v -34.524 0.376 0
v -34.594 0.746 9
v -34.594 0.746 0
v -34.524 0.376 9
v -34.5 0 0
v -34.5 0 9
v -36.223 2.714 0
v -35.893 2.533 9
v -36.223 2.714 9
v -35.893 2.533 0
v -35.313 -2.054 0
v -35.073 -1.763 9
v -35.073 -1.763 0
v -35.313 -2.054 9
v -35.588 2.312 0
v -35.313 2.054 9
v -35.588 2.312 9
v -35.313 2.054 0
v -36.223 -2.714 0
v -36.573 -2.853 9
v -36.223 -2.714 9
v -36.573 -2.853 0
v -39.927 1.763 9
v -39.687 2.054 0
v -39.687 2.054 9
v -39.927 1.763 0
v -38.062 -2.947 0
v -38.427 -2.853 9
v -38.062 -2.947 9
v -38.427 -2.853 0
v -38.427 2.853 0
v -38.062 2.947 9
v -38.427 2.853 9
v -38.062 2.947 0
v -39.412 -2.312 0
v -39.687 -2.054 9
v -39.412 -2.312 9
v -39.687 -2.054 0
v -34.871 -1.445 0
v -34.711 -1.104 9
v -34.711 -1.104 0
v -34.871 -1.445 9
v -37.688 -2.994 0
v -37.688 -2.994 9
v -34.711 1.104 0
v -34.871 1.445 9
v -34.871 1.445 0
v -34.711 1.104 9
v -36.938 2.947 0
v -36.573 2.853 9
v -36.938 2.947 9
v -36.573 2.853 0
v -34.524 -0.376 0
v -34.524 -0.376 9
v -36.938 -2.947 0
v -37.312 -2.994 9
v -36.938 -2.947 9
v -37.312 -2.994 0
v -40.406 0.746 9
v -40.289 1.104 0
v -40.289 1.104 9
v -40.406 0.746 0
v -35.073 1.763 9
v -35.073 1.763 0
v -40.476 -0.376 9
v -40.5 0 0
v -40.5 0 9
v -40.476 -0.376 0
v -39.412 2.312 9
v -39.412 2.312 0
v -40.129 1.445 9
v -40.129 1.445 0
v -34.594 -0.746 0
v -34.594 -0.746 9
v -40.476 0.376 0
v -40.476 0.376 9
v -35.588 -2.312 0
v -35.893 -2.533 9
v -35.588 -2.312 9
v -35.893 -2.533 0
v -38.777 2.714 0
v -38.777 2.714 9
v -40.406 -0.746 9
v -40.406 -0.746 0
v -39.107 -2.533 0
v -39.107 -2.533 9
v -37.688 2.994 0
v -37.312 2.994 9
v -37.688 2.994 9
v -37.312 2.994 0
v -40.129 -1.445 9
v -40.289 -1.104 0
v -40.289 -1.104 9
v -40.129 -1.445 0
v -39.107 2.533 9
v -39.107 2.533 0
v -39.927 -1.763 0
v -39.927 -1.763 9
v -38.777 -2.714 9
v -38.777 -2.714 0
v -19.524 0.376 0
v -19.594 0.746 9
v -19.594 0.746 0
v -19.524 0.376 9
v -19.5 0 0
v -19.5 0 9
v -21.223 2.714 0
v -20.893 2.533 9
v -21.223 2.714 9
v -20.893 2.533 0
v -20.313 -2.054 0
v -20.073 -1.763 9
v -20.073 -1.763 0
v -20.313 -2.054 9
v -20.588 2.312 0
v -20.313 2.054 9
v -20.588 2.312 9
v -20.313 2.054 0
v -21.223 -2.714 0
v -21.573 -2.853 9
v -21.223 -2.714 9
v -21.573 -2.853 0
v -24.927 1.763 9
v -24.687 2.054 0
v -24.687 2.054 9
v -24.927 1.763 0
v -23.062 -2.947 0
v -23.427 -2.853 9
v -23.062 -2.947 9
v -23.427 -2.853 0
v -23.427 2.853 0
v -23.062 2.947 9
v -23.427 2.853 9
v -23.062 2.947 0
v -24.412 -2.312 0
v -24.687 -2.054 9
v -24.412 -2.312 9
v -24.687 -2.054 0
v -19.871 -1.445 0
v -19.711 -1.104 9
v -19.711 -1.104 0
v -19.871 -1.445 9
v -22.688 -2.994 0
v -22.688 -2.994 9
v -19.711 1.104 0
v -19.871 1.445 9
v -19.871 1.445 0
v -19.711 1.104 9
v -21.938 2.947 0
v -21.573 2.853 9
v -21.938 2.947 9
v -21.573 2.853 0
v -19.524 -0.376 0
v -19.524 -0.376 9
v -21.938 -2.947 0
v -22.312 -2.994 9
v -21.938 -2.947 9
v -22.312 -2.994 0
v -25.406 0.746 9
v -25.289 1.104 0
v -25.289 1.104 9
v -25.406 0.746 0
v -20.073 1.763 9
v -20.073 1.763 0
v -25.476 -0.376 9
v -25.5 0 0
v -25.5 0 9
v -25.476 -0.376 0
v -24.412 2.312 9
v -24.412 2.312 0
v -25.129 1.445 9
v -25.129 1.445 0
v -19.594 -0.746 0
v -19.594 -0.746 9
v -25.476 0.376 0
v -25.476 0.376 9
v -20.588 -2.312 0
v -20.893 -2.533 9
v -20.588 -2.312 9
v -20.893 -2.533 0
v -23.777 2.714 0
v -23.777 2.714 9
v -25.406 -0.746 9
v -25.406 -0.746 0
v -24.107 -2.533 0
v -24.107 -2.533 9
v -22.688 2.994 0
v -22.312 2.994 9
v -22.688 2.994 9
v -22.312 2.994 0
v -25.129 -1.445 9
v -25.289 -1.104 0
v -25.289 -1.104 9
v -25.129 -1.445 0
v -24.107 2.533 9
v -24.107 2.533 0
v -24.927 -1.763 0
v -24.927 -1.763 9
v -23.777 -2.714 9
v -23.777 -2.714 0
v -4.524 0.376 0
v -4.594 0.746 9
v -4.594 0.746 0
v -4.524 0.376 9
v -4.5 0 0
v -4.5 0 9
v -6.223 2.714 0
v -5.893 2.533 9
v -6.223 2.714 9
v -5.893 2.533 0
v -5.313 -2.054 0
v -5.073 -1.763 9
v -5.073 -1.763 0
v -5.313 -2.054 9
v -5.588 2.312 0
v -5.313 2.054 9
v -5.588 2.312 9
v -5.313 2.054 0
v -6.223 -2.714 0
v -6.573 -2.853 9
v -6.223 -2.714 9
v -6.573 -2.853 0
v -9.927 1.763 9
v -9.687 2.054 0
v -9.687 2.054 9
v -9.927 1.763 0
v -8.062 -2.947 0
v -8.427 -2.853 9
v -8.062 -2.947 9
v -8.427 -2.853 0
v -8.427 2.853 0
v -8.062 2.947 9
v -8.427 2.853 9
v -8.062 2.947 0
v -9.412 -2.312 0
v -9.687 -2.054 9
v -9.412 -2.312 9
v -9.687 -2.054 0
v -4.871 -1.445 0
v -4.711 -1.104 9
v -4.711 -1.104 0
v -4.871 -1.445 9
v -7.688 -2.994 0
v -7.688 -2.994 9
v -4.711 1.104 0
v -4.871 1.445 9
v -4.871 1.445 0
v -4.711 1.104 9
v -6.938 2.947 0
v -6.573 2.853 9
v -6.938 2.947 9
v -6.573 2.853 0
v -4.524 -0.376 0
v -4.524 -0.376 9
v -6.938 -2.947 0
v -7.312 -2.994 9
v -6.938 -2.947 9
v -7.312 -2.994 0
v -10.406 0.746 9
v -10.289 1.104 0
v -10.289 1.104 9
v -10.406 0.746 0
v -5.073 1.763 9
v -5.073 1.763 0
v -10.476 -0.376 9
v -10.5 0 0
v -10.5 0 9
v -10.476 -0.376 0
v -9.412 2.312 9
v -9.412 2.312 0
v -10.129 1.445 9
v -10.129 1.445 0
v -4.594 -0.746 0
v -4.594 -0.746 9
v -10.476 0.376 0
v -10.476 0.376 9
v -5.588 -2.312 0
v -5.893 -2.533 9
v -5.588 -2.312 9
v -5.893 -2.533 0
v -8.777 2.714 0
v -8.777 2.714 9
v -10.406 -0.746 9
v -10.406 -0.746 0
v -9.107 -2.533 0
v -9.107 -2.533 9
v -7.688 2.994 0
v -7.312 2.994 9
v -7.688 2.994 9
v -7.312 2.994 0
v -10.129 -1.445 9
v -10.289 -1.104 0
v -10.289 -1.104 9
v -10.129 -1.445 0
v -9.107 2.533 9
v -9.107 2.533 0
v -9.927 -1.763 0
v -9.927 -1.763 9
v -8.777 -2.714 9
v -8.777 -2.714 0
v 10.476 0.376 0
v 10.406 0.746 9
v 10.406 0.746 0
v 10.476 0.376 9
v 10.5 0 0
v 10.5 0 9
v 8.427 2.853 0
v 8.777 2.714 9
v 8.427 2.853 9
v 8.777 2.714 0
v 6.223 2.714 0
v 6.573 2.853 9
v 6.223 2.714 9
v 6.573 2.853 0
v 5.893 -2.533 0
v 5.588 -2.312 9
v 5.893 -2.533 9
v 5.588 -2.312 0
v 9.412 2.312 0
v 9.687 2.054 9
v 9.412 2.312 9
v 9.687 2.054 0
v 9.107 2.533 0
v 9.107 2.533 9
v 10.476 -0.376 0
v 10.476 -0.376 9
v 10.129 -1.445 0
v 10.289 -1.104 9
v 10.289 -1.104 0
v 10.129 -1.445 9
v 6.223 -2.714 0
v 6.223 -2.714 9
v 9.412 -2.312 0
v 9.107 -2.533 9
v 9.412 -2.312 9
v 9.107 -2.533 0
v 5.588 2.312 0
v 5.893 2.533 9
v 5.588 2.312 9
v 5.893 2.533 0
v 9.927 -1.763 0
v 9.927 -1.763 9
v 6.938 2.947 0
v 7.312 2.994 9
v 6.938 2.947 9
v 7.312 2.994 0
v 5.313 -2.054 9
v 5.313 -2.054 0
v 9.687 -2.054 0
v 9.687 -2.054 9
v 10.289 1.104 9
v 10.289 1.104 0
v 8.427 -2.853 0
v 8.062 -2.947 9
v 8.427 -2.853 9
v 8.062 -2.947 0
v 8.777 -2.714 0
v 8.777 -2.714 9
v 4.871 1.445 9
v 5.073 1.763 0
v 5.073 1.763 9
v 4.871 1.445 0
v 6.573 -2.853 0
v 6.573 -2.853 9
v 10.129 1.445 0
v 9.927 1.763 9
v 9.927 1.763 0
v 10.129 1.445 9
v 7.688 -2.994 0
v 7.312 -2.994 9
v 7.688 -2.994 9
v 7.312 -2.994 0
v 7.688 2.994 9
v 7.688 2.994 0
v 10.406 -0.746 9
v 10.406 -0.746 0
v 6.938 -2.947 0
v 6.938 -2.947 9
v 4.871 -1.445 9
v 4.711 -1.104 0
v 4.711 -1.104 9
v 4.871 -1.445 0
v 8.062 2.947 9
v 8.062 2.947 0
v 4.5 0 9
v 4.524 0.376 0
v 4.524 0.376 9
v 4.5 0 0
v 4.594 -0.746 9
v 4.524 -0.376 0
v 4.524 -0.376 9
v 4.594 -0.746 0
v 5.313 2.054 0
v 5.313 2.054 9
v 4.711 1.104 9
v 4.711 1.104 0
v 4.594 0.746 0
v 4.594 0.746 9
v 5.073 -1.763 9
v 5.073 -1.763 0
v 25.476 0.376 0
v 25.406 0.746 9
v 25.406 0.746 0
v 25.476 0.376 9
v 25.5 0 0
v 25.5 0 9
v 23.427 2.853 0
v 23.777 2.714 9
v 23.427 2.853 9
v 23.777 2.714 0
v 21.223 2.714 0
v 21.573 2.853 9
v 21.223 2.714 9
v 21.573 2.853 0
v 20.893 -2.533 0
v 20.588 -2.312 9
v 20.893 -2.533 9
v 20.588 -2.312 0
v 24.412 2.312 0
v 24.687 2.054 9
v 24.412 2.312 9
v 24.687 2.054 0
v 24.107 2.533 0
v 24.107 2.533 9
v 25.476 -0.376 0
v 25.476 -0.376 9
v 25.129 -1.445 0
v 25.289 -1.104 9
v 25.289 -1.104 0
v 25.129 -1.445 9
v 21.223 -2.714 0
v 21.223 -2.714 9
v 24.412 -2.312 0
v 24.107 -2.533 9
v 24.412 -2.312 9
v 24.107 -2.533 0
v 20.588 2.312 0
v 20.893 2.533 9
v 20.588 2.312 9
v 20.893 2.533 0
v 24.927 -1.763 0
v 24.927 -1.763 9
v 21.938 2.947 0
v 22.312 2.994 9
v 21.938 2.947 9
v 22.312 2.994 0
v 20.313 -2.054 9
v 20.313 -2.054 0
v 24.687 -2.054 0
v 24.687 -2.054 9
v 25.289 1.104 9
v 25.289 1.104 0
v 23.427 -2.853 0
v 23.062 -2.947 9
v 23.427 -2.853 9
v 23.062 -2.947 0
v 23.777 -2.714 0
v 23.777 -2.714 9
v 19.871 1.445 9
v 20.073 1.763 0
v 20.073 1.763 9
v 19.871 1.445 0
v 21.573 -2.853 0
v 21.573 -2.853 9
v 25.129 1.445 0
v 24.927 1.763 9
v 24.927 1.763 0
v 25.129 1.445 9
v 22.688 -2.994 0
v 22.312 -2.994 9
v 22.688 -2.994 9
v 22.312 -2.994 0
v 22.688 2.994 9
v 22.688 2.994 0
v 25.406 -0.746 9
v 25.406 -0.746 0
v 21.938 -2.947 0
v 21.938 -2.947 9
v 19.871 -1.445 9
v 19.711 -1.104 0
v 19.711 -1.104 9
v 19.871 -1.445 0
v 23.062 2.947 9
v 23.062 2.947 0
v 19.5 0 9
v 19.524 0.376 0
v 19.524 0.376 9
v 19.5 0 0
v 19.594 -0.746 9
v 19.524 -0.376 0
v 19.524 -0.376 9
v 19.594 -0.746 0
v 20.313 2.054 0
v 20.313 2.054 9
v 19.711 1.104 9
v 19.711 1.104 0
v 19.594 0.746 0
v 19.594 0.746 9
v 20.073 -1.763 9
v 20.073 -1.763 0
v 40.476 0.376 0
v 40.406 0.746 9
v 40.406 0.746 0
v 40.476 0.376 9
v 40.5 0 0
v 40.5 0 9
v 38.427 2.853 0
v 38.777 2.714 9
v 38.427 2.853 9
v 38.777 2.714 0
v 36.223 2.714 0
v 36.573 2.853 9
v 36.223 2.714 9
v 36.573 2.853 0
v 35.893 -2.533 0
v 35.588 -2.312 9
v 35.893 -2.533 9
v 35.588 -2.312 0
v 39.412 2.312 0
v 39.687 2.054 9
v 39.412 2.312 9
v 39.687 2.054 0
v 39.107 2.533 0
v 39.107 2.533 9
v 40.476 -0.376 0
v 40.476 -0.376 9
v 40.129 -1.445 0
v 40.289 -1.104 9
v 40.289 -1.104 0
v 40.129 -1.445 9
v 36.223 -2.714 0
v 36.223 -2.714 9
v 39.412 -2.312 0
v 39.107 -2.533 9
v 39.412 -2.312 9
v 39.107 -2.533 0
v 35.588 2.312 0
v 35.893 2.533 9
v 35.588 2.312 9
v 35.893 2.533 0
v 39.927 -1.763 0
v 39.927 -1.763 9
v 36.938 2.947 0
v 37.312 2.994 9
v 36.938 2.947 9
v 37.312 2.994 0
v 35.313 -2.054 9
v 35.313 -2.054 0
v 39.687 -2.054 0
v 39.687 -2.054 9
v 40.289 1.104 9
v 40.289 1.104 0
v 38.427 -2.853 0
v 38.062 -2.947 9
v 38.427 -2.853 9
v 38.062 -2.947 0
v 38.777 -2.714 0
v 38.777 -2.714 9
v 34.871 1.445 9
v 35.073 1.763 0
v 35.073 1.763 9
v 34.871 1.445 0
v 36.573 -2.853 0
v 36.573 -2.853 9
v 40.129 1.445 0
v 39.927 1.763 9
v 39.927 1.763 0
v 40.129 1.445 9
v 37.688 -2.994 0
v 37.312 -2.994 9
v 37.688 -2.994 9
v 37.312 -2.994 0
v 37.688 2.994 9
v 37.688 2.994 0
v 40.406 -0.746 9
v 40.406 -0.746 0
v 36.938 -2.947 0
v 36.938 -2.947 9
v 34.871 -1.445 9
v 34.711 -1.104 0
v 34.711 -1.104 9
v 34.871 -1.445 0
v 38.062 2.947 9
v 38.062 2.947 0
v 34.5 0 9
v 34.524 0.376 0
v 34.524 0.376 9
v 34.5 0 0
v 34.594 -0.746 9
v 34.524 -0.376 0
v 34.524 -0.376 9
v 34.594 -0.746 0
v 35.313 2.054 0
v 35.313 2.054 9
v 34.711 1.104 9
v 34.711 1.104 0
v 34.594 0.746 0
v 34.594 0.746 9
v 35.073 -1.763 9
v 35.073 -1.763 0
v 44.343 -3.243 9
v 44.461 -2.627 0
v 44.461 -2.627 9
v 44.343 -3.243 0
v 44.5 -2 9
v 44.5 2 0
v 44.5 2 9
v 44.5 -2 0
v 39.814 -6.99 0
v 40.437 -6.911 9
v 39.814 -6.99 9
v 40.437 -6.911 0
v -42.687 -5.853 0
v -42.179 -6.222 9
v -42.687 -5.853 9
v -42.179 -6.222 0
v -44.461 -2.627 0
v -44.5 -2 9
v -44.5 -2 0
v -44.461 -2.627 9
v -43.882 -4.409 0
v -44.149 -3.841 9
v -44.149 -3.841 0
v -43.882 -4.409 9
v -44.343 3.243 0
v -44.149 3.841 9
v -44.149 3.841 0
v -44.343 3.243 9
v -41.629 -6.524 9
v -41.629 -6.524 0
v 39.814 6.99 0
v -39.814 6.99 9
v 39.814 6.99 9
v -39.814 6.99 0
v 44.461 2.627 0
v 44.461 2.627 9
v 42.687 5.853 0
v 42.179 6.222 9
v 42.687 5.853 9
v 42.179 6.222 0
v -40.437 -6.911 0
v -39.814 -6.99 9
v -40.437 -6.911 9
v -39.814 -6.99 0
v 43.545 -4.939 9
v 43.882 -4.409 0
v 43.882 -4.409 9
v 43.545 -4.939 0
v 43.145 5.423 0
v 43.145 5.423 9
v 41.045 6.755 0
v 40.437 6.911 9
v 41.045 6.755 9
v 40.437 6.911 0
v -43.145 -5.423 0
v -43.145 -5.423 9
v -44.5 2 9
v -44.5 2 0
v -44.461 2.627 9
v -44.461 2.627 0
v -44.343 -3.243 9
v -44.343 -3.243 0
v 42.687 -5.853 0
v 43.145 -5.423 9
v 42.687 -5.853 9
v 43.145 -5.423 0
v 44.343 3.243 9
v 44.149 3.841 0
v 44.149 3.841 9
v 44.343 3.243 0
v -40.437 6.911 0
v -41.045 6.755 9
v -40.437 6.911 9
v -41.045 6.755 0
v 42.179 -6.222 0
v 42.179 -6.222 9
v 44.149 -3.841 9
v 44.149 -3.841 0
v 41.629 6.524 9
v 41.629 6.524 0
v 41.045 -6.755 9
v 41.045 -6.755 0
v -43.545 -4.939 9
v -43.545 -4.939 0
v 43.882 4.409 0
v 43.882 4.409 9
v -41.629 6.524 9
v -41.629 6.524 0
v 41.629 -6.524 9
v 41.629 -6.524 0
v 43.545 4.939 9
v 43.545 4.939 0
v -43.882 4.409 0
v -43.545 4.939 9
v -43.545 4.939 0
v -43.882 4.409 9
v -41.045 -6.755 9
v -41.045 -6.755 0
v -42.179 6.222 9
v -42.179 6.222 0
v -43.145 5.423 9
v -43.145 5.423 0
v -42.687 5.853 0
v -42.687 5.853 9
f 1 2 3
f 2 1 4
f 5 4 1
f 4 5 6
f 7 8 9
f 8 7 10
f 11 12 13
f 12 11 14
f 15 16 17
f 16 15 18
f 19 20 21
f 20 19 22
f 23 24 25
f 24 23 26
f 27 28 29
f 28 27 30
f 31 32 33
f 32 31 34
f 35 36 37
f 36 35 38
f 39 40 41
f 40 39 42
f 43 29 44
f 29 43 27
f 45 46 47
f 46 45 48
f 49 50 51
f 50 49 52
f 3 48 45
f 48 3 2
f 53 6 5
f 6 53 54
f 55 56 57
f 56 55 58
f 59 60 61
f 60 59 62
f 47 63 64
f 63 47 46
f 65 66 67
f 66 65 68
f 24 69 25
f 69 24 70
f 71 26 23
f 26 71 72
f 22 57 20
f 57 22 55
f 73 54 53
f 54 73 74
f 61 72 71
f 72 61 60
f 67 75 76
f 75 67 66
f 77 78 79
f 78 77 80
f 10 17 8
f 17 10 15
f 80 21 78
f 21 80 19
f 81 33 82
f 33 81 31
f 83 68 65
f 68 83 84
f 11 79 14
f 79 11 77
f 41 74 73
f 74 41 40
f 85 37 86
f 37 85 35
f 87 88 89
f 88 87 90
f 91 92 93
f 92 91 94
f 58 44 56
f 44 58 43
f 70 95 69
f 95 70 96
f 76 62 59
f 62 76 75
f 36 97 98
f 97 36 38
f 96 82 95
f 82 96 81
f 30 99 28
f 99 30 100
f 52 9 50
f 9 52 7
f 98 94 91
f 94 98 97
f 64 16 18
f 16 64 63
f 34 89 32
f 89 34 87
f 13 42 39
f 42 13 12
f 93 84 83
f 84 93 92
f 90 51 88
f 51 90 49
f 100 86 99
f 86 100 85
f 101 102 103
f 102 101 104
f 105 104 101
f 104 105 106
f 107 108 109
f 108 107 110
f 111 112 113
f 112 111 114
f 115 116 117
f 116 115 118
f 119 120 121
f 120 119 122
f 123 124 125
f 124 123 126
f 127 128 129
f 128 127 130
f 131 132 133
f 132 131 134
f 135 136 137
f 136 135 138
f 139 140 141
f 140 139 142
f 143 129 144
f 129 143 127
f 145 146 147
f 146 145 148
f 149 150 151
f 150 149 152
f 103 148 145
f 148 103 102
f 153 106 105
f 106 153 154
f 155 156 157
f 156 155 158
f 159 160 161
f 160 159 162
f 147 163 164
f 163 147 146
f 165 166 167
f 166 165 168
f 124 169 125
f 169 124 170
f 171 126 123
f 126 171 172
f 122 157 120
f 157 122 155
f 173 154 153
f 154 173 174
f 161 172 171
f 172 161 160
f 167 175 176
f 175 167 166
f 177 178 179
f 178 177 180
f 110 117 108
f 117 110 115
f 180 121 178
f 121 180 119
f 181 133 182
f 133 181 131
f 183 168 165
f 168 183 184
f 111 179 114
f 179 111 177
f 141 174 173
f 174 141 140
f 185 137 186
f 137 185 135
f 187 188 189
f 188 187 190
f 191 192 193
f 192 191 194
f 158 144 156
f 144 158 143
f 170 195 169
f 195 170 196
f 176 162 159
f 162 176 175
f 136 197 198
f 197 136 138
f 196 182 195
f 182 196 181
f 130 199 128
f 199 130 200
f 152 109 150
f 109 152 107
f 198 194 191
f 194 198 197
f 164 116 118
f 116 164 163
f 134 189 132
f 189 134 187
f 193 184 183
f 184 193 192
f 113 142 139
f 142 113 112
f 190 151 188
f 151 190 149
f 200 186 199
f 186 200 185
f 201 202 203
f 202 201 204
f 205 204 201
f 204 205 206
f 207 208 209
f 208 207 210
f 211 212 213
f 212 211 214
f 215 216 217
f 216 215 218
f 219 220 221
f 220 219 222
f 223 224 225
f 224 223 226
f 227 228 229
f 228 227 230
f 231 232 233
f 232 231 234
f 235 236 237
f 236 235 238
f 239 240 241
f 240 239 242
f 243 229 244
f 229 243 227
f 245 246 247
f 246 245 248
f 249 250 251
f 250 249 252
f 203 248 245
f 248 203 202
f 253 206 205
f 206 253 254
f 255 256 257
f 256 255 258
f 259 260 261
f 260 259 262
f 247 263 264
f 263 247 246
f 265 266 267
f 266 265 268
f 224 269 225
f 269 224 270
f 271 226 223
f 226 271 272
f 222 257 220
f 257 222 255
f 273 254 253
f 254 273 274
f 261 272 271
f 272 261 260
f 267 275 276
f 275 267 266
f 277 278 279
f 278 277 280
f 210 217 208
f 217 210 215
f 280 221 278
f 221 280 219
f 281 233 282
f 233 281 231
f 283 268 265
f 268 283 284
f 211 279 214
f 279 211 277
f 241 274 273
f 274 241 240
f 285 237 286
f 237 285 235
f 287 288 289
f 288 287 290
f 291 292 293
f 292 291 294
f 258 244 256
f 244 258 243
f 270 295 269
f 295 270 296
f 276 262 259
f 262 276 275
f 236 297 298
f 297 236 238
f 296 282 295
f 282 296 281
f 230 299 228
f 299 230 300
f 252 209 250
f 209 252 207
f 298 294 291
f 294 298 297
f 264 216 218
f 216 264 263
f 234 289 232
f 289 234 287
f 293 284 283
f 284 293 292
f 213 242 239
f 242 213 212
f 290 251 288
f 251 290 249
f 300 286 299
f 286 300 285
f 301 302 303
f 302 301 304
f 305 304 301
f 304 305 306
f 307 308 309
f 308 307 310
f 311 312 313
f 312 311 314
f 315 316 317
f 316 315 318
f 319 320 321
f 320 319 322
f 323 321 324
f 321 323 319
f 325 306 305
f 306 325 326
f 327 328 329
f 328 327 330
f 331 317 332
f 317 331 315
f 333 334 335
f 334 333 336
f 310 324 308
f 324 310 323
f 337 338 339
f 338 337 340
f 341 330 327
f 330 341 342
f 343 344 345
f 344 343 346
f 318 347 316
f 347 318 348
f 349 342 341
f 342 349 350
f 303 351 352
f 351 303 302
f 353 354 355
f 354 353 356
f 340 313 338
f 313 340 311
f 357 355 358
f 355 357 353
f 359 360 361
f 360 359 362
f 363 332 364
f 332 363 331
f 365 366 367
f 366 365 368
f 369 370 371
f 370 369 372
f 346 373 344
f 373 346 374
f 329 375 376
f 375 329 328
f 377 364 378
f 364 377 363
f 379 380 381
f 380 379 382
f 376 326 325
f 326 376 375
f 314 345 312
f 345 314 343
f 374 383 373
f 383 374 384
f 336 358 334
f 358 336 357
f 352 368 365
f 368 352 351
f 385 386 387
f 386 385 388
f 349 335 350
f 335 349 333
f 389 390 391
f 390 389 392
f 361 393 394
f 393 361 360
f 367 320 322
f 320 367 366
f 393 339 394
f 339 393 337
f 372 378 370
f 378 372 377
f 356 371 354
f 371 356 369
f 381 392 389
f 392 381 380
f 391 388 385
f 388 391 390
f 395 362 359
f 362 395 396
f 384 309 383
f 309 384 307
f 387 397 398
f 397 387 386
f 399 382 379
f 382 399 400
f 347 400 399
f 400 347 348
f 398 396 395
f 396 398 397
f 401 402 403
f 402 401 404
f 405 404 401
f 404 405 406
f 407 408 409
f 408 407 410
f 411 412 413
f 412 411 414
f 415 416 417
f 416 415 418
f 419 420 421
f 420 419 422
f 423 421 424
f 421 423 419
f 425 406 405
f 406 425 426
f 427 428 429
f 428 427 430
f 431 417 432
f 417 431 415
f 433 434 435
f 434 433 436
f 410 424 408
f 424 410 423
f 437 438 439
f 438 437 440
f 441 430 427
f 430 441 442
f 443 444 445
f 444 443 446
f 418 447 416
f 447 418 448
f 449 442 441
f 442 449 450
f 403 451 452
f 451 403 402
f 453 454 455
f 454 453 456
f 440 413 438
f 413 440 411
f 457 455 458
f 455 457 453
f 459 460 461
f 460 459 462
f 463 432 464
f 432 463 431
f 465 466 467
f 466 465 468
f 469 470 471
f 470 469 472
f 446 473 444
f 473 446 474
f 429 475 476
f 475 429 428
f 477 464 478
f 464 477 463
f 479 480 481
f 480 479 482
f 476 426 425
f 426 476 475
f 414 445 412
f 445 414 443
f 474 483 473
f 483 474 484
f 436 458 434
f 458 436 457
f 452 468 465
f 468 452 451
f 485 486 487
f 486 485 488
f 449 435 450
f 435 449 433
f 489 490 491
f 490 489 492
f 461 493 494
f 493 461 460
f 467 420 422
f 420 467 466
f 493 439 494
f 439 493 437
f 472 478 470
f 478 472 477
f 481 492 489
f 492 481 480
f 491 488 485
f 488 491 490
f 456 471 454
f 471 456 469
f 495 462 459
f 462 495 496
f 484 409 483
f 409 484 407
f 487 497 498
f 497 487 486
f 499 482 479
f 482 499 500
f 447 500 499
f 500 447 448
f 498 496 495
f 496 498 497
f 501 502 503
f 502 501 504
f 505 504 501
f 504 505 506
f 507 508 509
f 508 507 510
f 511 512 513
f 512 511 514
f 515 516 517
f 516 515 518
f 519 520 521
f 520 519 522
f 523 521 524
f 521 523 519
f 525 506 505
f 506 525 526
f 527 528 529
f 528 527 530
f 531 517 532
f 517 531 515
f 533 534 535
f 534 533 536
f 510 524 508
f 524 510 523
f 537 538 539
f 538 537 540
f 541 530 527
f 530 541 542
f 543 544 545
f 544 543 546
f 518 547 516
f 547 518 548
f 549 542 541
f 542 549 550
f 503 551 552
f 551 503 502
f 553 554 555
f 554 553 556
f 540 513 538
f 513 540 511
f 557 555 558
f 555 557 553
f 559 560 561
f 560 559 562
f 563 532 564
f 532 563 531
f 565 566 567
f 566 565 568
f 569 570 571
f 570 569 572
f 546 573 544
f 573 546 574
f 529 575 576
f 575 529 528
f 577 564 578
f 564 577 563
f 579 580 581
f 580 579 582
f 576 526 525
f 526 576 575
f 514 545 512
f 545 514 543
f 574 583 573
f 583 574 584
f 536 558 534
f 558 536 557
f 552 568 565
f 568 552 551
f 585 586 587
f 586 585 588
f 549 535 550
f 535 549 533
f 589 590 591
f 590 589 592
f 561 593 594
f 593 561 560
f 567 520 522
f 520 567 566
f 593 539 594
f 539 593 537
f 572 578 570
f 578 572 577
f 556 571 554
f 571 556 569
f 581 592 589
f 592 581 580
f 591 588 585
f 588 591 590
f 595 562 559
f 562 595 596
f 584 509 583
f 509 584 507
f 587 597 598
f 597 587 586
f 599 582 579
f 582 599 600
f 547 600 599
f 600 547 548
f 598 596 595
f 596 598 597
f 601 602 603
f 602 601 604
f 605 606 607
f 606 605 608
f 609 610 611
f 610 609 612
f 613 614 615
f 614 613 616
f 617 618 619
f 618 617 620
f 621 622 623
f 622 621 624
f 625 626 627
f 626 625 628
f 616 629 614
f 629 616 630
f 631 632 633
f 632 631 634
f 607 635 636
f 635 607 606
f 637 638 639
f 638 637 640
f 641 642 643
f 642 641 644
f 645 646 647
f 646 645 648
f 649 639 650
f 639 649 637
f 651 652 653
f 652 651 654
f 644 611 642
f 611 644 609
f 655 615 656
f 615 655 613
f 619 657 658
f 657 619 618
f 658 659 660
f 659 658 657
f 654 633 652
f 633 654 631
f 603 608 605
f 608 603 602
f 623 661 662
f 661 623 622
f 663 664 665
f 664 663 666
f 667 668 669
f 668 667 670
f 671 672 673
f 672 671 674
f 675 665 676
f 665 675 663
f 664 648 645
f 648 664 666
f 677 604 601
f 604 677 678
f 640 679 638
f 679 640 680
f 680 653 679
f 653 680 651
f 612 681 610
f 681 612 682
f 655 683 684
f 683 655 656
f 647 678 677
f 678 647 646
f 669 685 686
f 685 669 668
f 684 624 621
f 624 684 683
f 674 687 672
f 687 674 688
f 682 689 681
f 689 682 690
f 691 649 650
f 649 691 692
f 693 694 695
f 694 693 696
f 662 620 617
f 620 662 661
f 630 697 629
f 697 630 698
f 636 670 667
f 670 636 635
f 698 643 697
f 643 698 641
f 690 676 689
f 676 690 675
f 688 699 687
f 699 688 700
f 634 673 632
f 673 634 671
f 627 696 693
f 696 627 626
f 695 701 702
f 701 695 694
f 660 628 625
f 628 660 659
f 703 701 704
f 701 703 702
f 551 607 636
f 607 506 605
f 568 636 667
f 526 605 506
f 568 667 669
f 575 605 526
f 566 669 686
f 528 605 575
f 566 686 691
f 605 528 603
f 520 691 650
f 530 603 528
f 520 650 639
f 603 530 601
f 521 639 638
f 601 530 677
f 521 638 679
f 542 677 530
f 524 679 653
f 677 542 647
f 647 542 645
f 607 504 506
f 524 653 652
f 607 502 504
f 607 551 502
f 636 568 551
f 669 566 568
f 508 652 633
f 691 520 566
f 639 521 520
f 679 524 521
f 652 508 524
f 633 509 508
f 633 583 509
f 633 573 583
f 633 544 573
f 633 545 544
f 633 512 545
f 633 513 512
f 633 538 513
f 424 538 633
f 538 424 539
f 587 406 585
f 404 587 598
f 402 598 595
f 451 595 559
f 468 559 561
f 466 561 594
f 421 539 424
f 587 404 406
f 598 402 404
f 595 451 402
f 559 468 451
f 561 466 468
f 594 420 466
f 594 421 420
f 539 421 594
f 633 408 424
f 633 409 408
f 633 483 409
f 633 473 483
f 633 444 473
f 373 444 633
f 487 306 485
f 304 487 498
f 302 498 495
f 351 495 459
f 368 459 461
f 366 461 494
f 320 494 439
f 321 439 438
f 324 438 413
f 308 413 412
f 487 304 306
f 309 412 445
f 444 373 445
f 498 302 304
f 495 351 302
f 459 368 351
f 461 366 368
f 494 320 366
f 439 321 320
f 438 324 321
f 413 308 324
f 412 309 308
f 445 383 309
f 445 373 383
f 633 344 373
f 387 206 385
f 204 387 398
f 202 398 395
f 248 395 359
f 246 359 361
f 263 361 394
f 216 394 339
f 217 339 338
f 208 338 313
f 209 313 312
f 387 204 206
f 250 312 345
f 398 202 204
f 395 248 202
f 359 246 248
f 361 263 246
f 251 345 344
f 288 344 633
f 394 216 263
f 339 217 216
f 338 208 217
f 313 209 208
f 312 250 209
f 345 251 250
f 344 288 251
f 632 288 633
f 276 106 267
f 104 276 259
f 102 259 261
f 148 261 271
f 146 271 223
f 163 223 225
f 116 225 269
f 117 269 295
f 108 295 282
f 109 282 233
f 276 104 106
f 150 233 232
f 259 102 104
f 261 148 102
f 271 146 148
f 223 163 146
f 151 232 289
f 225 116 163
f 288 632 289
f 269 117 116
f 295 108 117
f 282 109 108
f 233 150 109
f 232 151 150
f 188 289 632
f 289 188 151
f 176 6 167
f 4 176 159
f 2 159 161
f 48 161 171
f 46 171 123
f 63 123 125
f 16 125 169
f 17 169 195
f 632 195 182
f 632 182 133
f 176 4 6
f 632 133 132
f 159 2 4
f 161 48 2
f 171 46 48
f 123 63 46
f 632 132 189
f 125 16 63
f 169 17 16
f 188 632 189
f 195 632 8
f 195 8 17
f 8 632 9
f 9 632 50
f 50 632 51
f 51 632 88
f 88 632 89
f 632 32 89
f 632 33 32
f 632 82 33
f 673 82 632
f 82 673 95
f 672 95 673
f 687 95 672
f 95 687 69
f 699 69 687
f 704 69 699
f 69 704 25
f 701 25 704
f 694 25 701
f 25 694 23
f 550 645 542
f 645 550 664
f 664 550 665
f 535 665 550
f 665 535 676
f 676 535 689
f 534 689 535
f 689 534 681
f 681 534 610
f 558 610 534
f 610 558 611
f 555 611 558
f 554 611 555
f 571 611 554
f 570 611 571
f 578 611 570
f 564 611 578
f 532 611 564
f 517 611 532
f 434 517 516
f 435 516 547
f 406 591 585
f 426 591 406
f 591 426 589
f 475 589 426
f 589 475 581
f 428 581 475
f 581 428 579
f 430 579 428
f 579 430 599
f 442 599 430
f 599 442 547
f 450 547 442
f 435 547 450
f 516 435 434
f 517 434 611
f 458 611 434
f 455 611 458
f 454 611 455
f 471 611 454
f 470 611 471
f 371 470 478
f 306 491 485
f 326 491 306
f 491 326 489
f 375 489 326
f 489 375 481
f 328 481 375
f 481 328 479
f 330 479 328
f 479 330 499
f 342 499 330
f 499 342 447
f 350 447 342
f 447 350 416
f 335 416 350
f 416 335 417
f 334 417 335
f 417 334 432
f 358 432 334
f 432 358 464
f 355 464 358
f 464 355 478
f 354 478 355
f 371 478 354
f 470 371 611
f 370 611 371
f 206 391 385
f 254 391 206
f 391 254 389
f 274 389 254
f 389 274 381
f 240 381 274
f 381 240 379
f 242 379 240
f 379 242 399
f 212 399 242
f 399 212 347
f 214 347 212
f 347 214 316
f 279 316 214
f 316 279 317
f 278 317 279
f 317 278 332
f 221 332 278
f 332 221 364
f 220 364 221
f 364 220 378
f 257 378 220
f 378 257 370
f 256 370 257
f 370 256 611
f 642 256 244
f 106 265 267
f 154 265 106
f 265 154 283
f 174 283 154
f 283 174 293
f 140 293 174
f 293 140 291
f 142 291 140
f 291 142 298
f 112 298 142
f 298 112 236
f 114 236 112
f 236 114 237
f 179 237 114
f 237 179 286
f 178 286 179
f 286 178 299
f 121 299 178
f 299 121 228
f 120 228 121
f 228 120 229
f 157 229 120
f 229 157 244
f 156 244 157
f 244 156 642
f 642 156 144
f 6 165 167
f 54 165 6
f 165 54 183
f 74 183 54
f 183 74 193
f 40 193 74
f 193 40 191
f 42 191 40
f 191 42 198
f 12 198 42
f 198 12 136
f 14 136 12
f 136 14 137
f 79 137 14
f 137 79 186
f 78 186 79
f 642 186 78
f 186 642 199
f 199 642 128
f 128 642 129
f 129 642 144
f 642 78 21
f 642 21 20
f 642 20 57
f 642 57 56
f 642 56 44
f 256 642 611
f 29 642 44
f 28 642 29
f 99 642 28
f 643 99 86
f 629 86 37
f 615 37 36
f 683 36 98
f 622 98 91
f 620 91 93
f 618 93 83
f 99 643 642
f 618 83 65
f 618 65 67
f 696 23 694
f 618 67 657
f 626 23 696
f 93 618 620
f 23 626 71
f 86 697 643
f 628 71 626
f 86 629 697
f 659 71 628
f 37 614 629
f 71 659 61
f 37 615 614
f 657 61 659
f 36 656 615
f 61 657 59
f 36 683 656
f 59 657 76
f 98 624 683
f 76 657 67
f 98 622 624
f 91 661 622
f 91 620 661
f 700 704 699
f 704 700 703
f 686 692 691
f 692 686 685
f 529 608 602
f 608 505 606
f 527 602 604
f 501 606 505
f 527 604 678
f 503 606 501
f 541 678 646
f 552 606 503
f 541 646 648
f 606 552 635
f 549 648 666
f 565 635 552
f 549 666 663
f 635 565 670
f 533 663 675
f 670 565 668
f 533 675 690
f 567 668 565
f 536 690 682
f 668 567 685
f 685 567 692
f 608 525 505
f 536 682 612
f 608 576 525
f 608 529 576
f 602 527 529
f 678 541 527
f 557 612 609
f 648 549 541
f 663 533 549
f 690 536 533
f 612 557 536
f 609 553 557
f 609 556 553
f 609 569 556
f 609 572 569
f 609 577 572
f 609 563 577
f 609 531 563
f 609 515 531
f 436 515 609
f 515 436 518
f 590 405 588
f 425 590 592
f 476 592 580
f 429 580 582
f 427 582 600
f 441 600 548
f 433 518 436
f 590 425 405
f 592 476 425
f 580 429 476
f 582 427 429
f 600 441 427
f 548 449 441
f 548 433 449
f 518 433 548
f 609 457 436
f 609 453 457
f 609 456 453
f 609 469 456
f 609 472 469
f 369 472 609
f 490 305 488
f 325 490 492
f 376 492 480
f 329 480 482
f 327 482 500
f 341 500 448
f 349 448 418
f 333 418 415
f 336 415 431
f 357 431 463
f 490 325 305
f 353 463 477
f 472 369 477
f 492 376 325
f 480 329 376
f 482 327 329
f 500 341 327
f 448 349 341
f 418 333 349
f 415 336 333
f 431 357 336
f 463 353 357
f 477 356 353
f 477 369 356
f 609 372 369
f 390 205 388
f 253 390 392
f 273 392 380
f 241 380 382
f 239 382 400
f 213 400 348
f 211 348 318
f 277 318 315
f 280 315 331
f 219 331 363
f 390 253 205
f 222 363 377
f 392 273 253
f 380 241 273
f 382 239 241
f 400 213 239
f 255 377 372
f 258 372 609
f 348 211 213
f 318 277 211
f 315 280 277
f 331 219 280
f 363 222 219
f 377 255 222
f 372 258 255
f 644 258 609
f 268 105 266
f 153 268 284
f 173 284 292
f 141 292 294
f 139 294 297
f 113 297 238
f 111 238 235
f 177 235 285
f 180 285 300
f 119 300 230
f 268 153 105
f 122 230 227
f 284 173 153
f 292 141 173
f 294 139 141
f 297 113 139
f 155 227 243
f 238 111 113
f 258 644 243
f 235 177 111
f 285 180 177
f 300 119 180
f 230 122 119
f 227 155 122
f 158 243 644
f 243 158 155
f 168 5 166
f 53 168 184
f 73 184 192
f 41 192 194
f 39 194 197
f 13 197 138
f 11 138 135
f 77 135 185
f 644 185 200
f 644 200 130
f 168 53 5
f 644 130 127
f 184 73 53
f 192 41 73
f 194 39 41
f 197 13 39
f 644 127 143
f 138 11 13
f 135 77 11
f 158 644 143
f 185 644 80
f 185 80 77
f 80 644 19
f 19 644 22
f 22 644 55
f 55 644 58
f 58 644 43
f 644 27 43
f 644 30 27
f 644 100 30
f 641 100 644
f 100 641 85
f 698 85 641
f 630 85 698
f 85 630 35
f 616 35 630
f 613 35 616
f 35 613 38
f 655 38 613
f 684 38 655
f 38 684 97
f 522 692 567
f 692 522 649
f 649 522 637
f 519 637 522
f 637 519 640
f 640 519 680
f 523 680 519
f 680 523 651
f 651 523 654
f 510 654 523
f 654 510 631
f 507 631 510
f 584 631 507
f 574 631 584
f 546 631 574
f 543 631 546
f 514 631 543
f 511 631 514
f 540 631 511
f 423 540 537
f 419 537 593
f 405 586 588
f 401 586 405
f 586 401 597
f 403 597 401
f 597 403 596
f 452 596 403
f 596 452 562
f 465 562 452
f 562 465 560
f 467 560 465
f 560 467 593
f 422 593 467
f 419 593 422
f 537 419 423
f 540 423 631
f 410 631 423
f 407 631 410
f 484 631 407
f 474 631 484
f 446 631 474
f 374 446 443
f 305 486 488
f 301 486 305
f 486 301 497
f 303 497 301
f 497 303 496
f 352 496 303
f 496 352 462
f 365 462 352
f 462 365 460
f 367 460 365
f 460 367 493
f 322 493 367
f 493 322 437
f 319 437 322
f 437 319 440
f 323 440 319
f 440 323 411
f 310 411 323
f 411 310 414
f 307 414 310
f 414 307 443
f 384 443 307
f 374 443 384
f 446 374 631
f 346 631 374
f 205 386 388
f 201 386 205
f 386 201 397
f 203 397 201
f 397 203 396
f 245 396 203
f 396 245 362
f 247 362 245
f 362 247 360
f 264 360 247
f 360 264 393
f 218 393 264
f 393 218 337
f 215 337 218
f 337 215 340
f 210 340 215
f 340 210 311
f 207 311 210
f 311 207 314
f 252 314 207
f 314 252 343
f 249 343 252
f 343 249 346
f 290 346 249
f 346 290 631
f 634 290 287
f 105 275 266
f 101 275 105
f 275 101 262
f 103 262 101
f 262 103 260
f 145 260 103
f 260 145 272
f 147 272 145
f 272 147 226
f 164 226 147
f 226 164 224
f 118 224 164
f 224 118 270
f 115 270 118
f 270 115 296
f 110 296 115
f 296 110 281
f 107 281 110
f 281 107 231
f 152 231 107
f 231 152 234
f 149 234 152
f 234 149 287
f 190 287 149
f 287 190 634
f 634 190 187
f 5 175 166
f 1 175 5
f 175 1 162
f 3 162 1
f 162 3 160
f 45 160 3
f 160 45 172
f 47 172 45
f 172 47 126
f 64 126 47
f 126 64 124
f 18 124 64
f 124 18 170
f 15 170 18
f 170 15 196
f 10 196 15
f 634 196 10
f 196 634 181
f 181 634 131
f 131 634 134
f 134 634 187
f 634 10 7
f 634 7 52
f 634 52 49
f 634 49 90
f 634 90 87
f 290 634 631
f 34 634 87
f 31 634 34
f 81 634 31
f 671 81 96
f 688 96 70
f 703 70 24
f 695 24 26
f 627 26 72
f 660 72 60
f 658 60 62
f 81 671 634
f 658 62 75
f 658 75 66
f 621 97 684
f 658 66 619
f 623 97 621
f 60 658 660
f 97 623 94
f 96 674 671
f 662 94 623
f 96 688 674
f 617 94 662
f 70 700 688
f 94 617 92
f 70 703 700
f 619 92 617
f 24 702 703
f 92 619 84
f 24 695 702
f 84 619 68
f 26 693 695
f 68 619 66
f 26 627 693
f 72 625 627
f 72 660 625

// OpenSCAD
$fn = 50;


difference() {
	union() {
		hull() {
			translate(v = [-39.5000000000, 2.0000000000, 0]) {
				cylinder(h = 9, r = 5);
			}
			translate(v = [39.5000000000, 2.0000000000, 0]) {
				cylinder(h = 9, r = 5);
			}
			translate(v = [-39.5000000000, -2.0000000000, 0]) {
				cylinder(h = 9, r = 5);
			}
			translate(v = [39.5000000000, -2.0000000000, 0]) {
				cylinder(h = 9, r = 5);
			}
		}
	}
	union() {
		translate(v = [-37.5000000000, 0.0000000000, 0]) {
			translate(v = [0, 0, -100]) {
				cylinder(h = 200, r = 3.0000000000);
			}
		}
		translate(v = [-22.5000000000, 0.0000000000, 0]) {
			translate(v = [0, 0, -100]) {
				cylinder(h = 200, r = 3.0000000000);
			}
		}
		translate(v = [-7.5000000000, 0.0000000000, 0]) {
			translate(v = [0, 0, -100]) {
				cylinder(h = 200, r = 3.0000000000);
			}
		}
		translate(v = [7.5000000000, 0.0000000000, 0]) {
			translate(v = [0, 0, -100]) {
				cylinder(h = 200, r = 3.0000000000);
			}
		}
		translate(v = [22.5000000000, 0.0000000000, 0]) {
			translate(v = [0, 0, -100]) {
				cylinder(h = 200, r = 3.0000000000);
			}
		}
		translate(v = [37.5000000000, 0.0000000000, 0]) {
			translate(v = [0, 0, -100]) {
				cylinder(h = 200, r = 3.0000000000);
			}
		}
	}
}
